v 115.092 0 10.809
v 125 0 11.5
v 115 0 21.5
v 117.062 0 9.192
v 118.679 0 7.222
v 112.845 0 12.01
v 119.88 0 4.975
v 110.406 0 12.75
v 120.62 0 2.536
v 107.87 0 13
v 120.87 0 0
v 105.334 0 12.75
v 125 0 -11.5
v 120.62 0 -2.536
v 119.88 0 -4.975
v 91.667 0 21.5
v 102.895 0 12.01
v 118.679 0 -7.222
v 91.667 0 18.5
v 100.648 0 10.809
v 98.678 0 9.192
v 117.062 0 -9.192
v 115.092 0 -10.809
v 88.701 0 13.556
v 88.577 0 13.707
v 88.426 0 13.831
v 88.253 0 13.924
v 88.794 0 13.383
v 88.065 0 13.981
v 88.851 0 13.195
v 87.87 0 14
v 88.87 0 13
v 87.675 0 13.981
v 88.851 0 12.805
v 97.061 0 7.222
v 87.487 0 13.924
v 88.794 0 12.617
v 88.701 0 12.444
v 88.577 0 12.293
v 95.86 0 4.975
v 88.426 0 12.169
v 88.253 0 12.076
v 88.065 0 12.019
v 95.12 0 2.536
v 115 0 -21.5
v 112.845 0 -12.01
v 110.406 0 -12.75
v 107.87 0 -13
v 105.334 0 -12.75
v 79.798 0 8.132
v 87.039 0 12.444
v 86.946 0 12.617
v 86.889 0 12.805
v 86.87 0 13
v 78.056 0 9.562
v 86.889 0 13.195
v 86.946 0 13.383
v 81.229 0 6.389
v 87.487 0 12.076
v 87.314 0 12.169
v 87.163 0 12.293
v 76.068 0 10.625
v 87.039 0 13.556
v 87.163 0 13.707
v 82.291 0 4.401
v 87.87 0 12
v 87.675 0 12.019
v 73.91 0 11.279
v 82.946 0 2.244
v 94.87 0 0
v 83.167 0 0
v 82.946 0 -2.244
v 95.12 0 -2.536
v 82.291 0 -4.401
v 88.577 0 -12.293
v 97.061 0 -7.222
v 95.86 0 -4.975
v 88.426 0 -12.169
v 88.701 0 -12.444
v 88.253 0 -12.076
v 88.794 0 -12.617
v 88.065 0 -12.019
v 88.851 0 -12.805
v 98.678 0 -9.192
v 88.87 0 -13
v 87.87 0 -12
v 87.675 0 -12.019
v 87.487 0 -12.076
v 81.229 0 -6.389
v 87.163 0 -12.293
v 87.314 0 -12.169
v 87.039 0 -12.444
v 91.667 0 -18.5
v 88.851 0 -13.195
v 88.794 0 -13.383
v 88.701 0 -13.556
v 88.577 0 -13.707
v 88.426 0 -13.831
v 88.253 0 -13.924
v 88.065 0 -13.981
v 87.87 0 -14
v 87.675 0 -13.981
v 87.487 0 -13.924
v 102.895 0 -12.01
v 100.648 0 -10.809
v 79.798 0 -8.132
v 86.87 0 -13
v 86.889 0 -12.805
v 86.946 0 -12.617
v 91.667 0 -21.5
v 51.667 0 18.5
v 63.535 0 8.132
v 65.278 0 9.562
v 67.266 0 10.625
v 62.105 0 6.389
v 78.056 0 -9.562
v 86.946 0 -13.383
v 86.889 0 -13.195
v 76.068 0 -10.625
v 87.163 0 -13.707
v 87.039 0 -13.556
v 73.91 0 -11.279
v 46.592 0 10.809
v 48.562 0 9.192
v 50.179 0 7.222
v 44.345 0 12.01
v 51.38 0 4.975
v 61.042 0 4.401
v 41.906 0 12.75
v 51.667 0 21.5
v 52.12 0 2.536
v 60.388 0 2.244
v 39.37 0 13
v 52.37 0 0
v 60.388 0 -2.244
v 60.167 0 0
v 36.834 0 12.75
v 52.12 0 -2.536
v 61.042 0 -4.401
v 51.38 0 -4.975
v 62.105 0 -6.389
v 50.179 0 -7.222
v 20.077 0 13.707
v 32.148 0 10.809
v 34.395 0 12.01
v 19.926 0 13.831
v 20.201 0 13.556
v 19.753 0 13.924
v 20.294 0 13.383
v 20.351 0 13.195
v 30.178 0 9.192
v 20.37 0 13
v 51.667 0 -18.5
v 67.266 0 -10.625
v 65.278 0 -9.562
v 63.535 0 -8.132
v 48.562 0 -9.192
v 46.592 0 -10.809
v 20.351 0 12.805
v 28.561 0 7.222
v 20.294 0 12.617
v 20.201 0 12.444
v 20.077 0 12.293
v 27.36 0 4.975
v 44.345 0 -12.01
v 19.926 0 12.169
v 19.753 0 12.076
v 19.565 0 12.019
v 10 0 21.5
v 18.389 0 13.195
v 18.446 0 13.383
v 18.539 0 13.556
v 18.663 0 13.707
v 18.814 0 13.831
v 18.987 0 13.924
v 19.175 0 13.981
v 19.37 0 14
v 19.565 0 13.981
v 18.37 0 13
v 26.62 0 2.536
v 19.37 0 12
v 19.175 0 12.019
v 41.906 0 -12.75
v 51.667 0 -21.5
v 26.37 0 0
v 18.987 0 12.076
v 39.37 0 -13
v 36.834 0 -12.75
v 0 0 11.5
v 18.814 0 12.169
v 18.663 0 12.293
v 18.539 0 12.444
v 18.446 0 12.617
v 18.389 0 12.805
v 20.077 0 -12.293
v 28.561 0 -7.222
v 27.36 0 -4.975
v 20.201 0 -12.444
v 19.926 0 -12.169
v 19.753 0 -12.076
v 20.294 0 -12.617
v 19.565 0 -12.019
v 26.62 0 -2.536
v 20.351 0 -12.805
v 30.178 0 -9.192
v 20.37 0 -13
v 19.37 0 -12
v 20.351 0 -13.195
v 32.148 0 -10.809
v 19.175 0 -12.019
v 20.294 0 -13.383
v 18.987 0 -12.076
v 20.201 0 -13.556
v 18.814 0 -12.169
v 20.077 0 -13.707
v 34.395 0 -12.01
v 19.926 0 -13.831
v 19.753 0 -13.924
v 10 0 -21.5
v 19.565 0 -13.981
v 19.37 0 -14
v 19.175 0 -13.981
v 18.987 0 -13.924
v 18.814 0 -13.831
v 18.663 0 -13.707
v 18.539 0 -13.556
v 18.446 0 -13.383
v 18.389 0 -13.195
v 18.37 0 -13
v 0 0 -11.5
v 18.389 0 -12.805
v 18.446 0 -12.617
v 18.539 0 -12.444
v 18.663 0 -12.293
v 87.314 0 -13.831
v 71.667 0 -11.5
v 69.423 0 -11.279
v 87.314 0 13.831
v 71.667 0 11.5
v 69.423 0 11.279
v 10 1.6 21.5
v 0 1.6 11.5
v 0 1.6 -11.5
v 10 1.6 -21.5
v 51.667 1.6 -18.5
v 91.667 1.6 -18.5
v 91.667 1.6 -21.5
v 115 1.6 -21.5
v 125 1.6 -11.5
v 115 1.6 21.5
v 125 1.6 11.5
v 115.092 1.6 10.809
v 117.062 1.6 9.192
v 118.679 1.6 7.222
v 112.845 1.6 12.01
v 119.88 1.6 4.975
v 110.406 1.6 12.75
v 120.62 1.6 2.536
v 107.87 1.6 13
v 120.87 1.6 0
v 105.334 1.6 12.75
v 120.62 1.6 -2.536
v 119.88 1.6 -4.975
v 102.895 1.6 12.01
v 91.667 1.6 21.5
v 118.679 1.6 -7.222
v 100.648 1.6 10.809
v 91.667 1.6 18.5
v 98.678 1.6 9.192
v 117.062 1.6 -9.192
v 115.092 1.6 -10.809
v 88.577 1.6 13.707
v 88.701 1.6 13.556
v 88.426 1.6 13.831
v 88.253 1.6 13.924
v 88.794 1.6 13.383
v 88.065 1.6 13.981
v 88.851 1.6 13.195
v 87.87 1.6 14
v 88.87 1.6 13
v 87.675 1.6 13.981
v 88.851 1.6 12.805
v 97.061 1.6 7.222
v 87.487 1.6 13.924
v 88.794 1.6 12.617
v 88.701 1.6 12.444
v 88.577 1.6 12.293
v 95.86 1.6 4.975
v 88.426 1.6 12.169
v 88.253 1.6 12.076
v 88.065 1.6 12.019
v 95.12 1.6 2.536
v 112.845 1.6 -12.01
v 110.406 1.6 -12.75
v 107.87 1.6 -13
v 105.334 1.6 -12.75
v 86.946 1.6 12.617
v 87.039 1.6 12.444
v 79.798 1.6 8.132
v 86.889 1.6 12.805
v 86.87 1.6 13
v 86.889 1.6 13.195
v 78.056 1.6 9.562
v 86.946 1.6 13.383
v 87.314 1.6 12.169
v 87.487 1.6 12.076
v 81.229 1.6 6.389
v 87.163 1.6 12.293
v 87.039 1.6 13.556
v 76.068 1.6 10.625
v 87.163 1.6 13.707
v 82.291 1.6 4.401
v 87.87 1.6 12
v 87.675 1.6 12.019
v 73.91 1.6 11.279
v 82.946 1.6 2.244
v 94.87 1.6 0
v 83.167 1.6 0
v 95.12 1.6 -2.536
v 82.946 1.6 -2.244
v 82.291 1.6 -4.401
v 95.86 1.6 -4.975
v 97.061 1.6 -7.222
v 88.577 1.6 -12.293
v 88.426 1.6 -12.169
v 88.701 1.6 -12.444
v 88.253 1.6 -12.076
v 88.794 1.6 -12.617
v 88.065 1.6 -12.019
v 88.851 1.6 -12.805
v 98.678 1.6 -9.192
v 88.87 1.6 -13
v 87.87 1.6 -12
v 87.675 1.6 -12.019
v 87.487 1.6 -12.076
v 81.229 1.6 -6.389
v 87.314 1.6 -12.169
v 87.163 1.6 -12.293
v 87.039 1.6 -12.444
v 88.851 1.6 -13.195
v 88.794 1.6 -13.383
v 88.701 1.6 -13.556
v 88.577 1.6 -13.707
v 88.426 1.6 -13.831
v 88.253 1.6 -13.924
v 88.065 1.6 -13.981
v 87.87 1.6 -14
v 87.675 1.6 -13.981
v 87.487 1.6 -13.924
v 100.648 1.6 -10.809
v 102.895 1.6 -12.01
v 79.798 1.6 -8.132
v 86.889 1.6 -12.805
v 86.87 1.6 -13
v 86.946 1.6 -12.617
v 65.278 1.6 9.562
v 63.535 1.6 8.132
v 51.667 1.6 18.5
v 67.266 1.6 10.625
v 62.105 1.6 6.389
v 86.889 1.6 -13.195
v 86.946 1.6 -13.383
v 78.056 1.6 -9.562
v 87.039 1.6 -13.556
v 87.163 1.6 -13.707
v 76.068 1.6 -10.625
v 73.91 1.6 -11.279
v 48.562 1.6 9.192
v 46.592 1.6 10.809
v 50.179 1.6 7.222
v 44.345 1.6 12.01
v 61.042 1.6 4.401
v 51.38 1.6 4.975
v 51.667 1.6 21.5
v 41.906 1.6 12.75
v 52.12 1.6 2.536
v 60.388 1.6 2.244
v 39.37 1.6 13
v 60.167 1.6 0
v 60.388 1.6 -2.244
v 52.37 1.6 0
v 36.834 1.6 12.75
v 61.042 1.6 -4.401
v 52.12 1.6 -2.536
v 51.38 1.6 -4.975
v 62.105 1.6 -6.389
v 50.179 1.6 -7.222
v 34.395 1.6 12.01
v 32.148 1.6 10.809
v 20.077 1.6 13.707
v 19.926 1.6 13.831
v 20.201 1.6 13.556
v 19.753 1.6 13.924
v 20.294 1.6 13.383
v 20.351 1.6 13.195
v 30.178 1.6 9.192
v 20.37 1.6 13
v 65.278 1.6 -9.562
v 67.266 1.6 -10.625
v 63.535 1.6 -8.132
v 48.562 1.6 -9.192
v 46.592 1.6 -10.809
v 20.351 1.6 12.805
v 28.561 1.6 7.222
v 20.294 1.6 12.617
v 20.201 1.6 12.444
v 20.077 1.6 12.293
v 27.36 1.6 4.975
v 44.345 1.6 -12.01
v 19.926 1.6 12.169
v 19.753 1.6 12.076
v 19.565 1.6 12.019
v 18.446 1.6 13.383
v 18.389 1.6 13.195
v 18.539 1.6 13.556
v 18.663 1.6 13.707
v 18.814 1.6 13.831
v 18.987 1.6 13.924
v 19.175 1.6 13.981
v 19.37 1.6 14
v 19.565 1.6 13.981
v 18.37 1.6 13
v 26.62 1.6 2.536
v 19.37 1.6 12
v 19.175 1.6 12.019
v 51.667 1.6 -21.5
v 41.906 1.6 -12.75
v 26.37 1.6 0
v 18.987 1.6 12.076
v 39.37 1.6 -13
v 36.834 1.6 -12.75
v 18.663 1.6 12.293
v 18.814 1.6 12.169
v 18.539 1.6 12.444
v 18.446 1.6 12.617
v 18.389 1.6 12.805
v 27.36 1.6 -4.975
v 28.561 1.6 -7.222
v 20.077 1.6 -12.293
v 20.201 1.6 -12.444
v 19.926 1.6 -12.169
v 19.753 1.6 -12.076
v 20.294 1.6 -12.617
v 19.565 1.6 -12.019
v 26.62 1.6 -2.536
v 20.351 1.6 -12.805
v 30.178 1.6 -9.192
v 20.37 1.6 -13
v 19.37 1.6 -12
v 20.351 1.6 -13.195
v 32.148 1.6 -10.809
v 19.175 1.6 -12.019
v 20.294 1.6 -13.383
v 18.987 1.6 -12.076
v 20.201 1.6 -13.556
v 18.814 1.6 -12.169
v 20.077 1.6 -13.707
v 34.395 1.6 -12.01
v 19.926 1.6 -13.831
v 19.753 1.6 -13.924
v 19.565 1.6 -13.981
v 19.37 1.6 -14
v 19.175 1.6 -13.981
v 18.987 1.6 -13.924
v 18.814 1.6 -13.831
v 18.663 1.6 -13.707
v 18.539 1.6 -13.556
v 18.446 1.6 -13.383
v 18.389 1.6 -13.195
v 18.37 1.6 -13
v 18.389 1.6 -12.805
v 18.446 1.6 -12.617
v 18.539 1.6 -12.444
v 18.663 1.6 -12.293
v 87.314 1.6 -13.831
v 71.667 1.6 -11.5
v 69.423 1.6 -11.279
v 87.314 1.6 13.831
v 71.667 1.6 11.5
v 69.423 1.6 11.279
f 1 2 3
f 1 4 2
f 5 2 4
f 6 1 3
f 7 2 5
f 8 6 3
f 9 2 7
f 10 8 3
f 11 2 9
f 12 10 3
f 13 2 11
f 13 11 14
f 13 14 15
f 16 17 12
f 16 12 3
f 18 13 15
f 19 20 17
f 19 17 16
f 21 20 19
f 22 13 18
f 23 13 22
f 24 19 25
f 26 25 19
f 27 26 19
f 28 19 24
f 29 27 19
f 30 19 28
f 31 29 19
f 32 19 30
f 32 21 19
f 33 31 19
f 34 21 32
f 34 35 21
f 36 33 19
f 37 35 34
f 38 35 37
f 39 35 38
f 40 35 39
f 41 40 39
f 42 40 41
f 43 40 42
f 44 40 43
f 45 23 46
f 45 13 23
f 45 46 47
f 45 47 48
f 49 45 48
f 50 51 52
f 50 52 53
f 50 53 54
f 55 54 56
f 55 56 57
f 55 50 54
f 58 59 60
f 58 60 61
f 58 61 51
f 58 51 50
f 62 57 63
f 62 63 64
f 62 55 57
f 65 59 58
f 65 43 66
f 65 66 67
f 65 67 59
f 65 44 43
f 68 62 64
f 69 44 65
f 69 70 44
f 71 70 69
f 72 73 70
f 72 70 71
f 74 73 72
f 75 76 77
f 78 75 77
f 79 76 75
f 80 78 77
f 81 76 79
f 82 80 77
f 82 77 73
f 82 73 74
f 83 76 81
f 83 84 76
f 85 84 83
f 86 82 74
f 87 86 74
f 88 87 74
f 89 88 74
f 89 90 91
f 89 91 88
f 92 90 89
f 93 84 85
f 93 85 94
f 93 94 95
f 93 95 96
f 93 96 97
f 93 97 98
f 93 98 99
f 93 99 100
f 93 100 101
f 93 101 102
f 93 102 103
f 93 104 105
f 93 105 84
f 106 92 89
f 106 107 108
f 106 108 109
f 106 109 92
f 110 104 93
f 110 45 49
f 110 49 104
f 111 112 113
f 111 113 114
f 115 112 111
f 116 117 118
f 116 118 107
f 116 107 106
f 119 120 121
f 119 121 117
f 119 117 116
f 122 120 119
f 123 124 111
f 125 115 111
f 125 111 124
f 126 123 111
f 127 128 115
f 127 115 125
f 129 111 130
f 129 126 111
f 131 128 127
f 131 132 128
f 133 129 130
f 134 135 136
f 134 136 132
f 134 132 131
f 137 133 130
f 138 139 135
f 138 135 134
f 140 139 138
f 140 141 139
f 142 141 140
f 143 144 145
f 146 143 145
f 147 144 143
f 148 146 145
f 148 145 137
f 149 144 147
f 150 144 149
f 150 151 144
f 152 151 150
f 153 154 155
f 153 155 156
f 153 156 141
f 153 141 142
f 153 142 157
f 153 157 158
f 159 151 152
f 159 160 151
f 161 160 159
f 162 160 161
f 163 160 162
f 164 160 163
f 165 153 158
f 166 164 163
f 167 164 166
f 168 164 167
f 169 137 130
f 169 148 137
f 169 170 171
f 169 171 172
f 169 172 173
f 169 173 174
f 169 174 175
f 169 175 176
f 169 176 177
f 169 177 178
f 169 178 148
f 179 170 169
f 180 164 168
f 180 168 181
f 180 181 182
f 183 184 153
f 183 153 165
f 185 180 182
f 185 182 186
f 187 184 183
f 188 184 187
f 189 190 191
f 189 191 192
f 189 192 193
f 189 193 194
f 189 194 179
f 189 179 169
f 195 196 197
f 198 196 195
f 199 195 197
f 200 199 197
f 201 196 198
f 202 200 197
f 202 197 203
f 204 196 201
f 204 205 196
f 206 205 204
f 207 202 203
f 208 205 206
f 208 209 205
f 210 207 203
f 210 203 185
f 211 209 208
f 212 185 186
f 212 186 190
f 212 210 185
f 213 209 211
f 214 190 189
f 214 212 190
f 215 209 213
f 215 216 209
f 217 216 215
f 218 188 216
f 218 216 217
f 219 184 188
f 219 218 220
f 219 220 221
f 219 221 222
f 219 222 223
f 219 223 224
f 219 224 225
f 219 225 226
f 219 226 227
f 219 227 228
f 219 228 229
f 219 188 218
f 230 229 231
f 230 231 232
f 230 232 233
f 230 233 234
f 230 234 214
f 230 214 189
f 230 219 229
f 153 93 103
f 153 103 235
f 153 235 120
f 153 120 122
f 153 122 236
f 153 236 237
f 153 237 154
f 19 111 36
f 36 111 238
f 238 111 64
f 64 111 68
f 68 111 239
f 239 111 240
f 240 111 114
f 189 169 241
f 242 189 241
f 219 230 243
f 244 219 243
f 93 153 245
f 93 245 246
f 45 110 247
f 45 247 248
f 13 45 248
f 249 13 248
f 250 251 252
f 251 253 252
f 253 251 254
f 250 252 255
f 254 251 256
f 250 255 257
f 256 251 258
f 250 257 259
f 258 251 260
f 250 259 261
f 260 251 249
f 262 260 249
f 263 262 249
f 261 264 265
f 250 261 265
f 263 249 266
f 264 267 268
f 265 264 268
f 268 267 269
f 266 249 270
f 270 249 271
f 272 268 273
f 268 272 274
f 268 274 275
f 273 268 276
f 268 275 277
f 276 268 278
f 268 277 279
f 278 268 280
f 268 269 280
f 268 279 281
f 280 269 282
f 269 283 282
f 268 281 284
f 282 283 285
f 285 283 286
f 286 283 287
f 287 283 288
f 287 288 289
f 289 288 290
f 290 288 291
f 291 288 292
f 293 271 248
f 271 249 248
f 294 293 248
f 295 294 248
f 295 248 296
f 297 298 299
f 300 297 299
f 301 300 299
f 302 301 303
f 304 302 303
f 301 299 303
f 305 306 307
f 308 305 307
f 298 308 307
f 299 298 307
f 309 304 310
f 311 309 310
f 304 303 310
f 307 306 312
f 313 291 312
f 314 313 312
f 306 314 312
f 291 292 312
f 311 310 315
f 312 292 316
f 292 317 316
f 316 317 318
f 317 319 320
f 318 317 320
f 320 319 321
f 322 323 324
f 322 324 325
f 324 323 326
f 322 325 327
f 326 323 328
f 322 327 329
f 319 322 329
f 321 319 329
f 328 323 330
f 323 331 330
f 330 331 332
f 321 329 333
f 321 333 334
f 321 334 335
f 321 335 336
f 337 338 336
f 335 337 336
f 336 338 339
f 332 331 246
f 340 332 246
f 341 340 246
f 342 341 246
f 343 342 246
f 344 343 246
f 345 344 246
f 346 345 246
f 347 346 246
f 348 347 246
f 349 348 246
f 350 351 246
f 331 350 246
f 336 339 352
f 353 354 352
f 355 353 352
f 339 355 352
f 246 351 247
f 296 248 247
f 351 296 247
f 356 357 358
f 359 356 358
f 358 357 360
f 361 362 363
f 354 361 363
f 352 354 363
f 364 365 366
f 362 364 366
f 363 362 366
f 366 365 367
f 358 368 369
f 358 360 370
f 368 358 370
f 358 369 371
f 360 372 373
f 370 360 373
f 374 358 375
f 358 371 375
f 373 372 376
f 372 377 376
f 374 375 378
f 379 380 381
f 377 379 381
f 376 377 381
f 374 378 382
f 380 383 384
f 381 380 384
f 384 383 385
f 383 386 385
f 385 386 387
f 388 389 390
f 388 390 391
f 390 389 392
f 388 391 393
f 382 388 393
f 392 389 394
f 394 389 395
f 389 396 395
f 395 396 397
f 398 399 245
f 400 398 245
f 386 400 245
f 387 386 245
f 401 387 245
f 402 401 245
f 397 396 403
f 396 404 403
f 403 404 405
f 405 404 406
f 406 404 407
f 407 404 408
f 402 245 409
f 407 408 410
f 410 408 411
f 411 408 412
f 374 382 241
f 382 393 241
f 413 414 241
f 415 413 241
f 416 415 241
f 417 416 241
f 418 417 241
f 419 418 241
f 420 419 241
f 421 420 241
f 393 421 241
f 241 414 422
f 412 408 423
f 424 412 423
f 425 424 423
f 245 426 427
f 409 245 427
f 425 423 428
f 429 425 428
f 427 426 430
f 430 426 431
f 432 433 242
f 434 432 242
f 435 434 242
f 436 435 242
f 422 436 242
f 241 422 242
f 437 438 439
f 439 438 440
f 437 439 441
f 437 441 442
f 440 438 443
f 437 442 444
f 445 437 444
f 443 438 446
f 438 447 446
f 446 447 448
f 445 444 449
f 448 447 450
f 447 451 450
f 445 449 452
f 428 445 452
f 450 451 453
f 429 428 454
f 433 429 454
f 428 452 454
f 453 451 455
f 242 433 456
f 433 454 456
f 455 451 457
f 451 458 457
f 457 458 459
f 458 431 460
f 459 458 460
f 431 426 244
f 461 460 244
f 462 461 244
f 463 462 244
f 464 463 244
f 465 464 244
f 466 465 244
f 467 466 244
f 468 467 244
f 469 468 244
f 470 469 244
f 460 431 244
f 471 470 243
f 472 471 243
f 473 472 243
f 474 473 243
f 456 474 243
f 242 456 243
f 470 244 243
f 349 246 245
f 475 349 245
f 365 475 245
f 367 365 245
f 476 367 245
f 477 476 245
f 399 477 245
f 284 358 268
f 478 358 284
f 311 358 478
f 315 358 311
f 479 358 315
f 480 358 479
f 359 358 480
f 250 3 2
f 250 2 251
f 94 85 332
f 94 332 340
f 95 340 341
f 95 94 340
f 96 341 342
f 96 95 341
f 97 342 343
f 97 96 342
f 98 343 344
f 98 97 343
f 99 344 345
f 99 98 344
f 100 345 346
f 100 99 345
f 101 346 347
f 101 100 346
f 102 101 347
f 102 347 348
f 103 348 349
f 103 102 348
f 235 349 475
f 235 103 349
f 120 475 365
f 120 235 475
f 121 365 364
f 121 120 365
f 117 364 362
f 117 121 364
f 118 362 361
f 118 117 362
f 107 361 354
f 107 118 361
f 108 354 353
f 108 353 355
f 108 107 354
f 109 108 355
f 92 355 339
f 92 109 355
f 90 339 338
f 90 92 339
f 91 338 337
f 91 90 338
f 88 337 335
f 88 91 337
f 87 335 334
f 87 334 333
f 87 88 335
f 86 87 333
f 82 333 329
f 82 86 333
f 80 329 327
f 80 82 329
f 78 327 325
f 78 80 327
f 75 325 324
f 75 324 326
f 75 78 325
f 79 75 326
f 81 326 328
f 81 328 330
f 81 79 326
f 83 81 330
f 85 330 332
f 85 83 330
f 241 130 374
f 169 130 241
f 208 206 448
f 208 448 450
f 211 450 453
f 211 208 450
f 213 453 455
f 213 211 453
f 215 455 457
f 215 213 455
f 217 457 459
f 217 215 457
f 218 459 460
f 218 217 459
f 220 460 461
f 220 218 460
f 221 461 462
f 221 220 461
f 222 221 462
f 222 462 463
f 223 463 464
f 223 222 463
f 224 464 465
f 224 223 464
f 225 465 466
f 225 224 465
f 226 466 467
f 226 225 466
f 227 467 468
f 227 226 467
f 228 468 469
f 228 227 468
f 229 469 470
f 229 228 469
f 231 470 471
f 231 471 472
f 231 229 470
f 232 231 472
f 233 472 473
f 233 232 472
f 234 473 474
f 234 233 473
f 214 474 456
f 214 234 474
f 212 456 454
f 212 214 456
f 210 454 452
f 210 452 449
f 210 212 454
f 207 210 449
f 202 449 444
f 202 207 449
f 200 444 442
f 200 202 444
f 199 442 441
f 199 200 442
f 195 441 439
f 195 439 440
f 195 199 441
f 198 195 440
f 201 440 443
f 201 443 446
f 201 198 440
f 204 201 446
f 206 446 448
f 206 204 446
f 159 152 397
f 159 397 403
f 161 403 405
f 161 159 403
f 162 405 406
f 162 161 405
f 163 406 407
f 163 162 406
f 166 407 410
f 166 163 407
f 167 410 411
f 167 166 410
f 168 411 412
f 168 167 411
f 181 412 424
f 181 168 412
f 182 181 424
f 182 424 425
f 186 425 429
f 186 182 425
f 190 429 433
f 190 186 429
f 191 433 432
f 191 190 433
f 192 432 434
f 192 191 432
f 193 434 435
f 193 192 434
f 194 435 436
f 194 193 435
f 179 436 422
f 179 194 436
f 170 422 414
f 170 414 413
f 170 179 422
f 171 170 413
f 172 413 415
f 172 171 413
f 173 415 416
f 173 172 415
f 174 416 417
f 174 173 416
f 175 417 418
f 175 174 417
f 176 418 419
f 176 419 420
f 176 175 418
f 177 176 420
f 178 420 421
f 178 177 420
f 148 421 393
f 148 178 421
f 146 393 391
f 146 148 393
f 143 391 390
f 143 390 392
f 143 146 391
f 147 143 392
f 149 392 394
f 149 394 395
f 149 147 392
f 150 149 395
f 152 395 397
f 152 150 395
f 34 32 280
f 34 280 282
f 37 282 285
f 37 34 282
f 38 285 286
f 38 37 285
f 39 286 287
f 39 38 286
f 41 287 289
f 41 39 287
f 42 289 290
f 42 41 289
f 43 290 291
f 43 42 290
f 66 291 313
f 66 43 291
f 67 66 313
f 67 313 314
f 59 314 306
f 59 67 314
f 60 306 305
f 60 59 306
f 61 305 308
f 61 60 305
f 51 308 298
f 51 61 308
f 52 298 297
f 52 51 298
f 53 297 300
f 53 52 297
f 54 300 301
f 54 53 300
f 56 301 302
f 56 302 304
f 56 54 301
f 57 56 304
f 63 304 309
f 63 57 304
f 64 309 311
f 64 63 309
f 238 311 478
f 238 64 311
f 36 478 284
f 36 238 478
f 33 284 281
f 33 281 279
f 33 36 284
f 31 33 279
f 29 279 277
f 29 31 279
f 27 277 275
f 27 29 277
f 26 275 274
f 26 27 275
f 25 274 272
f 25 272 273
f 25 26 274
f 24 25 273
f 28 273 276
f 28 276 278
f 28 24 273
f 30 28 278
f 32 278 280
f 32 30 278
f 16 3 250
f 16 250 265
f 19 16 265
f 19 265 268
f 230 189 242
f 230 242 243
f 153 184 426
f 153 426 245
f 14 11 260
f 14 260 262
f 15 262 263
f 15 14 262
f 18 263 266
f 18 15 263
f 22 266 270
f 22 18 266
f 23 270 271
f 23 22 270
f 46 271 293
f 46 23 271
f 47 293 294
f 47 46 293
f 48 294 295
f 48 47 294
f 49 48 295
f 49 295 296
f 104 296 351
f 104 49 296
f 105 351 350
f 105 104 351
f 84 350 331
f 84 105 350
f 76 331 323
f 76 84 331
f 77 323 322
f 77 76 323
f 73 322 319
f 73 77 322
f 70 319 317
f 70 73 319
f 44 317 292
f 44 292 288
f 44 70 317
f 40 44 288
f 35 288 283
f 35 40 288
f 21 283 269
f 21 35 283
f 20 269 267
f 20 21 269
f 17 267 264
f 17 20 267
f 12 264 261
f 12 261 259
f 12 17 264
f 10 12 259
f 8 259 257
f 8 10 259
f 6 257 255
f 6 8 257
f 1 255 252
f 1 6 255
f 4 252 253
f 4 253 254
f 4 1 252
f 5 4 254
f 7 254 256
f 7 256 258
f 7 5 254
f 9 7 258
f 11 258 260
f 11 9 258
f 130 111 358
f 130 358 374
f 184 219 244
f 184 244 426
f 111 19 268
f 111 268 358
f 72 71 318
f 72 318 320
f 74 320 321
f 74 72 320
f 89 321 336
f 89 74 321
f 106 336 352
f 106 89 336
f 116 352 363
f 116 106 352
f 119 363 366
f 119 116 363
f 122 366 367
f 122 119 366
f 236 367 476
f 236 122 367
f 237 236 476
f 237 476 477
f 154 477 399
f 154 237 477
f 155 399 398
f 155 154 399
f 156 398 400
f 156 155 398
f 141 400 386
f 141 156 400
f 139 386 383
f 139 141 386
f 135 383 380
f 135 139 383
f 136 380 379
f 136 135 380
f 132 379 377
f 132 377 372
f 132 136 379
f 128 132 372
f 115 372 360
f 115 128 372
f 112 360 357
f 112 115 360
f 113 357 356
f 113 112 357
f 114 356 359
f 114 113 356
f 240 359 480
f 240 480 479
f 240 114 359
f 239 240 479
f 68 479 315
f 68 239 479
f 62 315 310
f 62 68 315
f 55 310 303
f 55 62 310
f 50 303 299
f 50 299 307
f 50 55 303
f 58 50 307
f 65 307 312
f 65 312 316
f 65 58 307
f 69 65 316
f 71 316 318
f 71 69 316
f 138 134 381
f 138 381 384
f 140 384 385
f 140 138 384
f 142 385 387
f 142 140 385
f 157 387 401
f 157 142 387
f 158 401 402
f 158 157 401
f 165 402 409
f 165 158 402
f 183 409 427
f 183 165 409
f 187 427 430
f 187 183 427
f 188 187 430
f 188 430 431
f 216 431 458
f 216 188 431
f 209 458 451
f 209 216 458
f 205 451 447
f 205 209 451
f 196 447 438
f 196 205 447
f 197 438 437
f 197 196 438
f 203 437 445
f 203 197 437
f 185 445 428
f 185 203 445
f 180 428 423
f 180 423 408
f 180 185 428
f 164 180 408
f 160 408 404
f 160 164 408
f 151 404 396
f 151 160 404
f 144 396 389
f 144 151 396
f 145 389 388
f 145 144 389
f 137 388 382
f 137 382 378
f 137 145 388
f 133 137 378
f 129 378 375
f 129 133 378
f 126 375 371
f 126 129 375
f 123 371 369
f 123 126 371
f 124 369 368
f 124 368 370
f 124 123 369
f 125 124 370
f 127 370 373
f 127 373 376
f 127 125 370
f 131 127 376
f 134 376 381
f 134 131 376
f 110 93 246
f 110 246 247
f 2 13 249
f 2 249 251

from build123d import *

# Parameters (mm, degrees)
SKETCH2_R           = 1
SKETCH2_R_2         = 13
SKETCH2_R_3         = 11.5
BOSS_EXTRUDE1_DEPTH = 1.6
CHAMFER1_SIZE       = 10


with BuildPart() as part:
    # Sketch2 → Boss-Extrude1 (new body)
    with BuildSketch(Plane(origin=(0, 0, 0), x_dir=(1, 0, 0), z_dir=(0, 1, 0))):
        Polygon((0, 21.5), (51.666666667, 21.5), (51.666666667, 18.5), (91.666666667, 18.5), (91.666666667, 21.5), (125, 21.5), (125, -21.5), (91.666666667, -21.5), (91.666666667, -18.5), (51.666666667, -18.5), (51.666666667, -21.5), (0, -21.5), align=None)
        with Locations((19.37, 13)):
            Circle(SKETCH2_R, mode=Mode.SUBTRACT)
        with Locations((87.87, 13)):
            Circle(SKETCH2_R, mode=Mode.SUBTRACT)
        with Locations((87.87, -13)):
            Circle(SKETCH2_R, mode=Mode.SUBTRACT)
        with Locations((19.37, -13)):
            Circle(SKETCH2_R, mode=Mode.SUBTRACT)
        with Locations((39.37, 0)):
            Circle(SKETCH2_R_2, mode=Mode.SUBTRACT)
        with Locations((107.87, 0)):
            Circle(SKETCH2_R_2, mode=Mode.SUBTRACT)
        with Locations((71.666666667, 0)):
            Circle(SKETCH2_R_3, mode=Mode.SUBTRACT)
    extrude(amount=BOSS_EXTRUDE1_DEPTH)

    # Chamfer1
    chamfer1_edges = [part.edges().sort_by_distance(p)[0] for p in [
        (0, 0.8, 21.5),
        (0, 0.8, -21.5),
        (125, 0.8, -21.5),
        (125, 0.8, 21.5),
    ]]
    chamfer(chamfer1_edges, length=CHAMFER1_SIZE)


solid = part.part
